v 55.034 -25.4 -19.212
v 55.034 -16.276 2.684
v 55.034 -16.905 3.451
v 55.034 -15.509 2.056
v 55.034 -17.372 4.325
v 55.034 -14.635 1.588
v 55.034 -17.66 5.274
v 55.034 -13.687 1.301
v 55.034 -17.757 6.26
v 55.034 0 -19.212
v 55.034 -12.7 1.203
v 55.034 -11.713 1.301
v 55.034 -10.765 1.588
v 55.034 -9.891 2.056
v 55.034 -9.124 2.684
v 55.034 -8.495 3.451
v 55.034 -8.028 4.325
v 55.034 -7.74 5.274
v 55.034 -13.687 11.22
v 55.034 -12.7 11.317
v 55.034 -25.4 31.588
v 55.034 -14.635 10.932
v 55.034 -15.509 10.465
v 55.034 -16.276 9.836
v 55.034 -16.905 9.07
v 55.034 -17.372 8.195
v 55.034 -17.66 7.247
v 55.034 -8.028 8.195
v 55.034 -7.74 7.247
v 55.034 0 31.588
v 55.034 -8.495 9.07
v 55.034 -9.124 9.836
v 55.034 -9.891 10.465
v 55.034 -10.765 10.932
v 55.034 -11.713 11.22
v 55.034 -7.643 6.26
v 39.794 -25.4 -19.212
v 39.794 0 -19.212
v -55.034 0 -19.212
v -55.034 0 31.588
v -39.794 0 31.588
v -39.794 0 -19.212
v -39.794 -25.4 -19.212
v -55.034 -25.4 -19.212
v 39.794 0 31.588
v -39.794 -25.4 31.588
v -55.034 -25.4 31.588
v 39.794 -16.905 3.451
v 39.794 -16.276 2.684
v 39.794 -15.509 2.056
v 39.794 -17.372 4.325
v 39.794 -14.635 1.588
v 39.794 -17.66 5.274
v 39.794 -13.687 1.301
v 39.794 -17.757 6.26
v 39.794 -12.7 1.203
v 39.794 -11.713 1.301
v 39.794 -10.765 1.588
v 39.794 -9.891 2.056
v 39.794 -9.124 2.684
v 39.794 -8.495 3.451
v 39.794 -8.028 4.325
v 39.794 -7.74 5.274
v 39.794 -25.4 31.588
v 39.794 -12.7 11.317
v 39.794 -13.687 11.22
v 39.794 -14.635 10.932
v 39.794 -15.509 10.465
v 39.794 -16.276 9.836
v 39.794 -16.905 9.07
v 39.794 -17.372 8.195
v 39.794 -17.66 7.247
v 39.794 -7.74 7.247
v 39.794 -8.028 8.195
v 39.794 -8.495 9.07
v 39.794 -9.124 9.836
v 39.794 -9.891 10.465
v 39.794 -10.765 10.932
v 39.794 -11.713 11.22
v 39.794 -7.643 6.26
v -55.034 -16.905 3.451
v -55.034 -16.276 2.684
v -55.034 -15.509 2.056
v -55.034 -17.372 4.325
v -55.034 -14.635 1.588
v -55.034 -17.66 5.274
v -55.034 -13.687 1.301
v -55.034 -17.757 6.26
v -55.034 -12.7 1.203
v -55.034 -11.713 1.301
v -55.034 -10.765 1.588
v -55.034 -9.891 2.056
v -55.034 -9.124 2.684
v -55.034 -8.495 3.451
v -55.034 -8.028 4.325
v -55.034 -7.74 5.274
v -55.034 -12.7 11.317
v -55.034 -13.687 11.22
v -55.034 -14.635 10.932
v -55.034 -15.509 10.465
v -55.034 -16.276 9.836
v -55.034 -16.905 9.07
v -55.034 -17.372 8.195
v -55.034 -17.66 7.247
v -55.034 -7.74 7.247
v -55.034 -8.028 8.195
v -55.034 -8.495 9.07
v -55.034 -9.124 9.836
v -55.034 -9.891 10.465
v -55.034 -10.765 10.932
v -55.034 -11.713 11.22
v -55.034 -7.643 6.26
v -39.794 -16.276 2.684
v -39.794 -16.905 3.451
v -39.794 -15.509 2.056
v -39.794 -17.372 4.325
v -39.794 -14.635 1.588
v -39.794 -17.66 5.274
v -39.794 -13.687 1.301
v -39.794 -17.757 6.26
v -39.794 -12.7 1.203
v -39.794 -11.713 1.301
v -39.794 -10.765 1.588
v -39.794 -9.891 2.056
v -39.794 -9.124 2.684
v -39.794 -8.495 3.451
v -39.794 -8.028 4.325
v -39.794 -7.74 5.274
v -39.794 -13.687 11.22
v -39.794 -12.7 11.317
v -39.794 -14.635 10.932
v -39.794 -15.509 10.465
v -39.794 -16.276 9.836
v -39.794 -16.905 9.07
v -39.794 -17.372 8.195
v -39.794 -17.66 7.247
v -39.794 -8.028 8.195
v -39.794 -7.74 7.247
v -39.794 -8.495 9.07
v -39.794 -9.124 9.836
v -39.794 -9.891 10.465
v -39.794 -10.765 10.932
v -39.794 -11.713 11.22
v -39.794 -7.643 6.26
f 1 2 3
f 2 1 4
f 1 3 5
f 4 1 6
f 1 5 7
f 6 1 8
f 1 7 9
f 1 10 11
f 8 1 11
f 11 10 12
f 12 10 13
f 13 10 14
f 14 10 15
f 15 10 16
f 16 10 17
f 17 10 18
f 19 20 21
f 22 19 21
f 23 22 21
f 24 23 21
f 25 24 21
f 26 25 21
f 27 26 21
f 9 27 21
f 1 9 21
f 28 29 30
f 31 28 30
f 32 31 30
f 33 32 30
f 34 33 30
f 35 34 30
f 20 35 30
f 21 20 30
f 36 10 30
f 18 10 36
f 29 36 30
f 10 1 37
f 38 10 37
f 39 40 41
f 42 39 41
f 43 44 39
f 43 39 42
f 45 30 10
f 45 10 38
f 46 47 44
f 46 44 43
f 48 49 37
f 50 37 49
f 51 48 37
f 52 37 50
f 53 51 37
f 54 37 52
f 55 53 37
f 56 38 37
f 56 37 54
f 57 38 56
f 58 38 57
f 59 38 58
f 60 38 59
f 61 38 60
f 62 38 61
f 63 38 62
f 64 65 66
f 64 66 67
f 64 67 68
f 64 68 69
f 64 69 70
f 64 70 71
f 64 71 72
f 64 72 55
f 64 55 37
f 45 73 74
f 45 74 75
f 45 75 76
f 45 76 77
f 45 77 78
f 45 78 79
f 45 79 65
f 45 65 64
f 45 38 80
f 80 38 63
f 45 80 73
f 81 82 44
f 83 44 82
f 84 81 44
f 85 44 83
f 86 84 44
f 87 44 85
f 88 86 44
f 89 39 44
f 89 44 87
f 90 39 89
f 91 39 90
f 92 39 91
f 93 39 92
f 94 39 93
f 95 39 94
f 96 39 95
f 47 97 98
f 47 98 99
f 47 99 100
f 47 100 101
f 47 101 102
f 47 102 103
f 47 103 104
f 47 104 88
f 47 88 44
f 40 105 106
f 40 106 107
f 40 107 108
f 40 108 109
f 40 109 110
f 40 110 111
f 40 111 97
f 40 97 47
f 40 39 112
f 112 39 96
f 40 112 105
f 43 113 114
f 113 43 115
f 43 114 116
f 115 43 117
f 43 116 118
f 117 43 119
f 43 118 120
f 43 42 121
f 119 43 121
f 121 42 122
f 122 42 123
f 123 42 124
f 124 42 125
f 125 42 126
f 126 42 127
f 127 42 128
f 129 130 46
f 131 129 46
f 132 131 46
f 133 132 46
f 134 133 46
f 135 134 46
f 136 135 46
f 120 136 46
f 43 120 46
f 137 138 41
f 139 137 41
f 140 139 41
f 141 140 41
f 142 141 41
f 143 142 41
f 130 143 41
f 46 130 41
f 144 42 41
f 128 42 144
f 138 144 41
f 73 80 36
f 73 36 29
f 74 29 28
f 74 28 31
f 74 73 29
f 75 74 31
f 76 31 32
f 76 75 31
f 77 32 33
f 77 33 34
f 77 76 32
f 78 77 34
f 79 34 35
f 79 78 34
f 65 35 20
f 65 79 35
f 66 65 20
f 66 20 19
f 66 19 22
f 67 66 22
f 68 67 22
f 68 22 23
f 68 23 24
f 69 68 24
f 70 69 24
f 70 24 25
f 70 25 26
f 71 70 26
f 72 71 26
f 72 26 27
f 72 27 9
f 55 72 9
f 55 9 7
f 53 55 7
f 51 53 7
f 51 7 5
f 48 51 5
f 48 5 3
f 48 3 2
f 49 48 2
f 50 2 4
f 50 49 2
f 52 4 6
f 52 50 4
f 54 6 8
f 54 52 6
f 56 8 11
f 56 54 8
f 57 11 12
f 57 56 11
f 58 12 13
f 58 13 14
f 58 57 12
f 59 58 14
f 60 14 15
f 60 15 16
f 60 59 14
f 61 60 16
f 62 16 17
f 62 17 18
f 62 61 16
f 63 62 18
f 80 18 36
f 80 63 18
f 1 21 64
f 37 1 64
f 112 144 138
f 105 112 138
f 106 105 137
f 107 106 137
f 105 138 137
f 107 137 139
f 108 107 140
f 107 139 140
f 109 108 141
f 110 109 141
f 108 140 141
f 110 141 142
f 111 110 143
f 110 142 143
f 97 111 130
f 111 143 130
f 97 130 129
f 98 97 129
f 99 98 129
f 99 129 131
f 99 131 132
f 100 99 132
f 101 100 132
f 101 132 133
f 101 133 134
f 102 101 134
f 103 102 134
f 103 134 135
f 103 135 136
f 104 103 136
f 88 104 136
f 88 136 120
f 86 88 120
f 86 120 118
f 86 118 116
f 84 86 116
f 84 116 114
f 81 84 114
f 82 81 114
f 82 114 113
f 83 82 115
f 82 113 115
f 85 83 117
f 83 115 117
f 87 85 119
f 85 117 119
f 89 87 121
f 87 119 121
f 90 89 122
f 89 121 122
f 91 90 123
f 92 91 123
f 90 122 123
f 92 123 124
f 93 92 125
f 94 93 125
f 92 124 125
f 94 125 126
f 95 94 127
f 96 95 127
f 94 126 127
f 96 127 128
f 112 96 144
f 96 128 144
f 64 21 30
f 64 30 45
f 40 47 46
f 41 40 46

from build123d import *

# Parameters (mm, degrees)
F0_W     = 15.24
F0_H     = 50.8
F1_DEPTH = 25.4
F2_R     = 5.056787
F3_DEPTH = 25.4


with BuildPart() as f1:
    # F0 (on Front) → F1 (new body)
    with BuildSketch(Plane.XZ):
        with Locations((-47.413691, 6.187824)):
            Rectangle(F0_W, F0_H)
    extrude(amount=F1_DEPTH)

    # F2 (on face) → F3 (cut)
    with BuildSketch(Plane.YZ.offset(-39.793691)):
        with Locations((-12.7, 6.260165)):
            Circle(F2_R)
    extrude(amount=-F3_DEPTH, mode=Mode.SUBTRACT)


with BuildPart() as f4_1:
    # F4: instance of F1
    add(f1.part.mirror(Plane.YZ))


solid = Compound([f1.part, f4_1.part])
